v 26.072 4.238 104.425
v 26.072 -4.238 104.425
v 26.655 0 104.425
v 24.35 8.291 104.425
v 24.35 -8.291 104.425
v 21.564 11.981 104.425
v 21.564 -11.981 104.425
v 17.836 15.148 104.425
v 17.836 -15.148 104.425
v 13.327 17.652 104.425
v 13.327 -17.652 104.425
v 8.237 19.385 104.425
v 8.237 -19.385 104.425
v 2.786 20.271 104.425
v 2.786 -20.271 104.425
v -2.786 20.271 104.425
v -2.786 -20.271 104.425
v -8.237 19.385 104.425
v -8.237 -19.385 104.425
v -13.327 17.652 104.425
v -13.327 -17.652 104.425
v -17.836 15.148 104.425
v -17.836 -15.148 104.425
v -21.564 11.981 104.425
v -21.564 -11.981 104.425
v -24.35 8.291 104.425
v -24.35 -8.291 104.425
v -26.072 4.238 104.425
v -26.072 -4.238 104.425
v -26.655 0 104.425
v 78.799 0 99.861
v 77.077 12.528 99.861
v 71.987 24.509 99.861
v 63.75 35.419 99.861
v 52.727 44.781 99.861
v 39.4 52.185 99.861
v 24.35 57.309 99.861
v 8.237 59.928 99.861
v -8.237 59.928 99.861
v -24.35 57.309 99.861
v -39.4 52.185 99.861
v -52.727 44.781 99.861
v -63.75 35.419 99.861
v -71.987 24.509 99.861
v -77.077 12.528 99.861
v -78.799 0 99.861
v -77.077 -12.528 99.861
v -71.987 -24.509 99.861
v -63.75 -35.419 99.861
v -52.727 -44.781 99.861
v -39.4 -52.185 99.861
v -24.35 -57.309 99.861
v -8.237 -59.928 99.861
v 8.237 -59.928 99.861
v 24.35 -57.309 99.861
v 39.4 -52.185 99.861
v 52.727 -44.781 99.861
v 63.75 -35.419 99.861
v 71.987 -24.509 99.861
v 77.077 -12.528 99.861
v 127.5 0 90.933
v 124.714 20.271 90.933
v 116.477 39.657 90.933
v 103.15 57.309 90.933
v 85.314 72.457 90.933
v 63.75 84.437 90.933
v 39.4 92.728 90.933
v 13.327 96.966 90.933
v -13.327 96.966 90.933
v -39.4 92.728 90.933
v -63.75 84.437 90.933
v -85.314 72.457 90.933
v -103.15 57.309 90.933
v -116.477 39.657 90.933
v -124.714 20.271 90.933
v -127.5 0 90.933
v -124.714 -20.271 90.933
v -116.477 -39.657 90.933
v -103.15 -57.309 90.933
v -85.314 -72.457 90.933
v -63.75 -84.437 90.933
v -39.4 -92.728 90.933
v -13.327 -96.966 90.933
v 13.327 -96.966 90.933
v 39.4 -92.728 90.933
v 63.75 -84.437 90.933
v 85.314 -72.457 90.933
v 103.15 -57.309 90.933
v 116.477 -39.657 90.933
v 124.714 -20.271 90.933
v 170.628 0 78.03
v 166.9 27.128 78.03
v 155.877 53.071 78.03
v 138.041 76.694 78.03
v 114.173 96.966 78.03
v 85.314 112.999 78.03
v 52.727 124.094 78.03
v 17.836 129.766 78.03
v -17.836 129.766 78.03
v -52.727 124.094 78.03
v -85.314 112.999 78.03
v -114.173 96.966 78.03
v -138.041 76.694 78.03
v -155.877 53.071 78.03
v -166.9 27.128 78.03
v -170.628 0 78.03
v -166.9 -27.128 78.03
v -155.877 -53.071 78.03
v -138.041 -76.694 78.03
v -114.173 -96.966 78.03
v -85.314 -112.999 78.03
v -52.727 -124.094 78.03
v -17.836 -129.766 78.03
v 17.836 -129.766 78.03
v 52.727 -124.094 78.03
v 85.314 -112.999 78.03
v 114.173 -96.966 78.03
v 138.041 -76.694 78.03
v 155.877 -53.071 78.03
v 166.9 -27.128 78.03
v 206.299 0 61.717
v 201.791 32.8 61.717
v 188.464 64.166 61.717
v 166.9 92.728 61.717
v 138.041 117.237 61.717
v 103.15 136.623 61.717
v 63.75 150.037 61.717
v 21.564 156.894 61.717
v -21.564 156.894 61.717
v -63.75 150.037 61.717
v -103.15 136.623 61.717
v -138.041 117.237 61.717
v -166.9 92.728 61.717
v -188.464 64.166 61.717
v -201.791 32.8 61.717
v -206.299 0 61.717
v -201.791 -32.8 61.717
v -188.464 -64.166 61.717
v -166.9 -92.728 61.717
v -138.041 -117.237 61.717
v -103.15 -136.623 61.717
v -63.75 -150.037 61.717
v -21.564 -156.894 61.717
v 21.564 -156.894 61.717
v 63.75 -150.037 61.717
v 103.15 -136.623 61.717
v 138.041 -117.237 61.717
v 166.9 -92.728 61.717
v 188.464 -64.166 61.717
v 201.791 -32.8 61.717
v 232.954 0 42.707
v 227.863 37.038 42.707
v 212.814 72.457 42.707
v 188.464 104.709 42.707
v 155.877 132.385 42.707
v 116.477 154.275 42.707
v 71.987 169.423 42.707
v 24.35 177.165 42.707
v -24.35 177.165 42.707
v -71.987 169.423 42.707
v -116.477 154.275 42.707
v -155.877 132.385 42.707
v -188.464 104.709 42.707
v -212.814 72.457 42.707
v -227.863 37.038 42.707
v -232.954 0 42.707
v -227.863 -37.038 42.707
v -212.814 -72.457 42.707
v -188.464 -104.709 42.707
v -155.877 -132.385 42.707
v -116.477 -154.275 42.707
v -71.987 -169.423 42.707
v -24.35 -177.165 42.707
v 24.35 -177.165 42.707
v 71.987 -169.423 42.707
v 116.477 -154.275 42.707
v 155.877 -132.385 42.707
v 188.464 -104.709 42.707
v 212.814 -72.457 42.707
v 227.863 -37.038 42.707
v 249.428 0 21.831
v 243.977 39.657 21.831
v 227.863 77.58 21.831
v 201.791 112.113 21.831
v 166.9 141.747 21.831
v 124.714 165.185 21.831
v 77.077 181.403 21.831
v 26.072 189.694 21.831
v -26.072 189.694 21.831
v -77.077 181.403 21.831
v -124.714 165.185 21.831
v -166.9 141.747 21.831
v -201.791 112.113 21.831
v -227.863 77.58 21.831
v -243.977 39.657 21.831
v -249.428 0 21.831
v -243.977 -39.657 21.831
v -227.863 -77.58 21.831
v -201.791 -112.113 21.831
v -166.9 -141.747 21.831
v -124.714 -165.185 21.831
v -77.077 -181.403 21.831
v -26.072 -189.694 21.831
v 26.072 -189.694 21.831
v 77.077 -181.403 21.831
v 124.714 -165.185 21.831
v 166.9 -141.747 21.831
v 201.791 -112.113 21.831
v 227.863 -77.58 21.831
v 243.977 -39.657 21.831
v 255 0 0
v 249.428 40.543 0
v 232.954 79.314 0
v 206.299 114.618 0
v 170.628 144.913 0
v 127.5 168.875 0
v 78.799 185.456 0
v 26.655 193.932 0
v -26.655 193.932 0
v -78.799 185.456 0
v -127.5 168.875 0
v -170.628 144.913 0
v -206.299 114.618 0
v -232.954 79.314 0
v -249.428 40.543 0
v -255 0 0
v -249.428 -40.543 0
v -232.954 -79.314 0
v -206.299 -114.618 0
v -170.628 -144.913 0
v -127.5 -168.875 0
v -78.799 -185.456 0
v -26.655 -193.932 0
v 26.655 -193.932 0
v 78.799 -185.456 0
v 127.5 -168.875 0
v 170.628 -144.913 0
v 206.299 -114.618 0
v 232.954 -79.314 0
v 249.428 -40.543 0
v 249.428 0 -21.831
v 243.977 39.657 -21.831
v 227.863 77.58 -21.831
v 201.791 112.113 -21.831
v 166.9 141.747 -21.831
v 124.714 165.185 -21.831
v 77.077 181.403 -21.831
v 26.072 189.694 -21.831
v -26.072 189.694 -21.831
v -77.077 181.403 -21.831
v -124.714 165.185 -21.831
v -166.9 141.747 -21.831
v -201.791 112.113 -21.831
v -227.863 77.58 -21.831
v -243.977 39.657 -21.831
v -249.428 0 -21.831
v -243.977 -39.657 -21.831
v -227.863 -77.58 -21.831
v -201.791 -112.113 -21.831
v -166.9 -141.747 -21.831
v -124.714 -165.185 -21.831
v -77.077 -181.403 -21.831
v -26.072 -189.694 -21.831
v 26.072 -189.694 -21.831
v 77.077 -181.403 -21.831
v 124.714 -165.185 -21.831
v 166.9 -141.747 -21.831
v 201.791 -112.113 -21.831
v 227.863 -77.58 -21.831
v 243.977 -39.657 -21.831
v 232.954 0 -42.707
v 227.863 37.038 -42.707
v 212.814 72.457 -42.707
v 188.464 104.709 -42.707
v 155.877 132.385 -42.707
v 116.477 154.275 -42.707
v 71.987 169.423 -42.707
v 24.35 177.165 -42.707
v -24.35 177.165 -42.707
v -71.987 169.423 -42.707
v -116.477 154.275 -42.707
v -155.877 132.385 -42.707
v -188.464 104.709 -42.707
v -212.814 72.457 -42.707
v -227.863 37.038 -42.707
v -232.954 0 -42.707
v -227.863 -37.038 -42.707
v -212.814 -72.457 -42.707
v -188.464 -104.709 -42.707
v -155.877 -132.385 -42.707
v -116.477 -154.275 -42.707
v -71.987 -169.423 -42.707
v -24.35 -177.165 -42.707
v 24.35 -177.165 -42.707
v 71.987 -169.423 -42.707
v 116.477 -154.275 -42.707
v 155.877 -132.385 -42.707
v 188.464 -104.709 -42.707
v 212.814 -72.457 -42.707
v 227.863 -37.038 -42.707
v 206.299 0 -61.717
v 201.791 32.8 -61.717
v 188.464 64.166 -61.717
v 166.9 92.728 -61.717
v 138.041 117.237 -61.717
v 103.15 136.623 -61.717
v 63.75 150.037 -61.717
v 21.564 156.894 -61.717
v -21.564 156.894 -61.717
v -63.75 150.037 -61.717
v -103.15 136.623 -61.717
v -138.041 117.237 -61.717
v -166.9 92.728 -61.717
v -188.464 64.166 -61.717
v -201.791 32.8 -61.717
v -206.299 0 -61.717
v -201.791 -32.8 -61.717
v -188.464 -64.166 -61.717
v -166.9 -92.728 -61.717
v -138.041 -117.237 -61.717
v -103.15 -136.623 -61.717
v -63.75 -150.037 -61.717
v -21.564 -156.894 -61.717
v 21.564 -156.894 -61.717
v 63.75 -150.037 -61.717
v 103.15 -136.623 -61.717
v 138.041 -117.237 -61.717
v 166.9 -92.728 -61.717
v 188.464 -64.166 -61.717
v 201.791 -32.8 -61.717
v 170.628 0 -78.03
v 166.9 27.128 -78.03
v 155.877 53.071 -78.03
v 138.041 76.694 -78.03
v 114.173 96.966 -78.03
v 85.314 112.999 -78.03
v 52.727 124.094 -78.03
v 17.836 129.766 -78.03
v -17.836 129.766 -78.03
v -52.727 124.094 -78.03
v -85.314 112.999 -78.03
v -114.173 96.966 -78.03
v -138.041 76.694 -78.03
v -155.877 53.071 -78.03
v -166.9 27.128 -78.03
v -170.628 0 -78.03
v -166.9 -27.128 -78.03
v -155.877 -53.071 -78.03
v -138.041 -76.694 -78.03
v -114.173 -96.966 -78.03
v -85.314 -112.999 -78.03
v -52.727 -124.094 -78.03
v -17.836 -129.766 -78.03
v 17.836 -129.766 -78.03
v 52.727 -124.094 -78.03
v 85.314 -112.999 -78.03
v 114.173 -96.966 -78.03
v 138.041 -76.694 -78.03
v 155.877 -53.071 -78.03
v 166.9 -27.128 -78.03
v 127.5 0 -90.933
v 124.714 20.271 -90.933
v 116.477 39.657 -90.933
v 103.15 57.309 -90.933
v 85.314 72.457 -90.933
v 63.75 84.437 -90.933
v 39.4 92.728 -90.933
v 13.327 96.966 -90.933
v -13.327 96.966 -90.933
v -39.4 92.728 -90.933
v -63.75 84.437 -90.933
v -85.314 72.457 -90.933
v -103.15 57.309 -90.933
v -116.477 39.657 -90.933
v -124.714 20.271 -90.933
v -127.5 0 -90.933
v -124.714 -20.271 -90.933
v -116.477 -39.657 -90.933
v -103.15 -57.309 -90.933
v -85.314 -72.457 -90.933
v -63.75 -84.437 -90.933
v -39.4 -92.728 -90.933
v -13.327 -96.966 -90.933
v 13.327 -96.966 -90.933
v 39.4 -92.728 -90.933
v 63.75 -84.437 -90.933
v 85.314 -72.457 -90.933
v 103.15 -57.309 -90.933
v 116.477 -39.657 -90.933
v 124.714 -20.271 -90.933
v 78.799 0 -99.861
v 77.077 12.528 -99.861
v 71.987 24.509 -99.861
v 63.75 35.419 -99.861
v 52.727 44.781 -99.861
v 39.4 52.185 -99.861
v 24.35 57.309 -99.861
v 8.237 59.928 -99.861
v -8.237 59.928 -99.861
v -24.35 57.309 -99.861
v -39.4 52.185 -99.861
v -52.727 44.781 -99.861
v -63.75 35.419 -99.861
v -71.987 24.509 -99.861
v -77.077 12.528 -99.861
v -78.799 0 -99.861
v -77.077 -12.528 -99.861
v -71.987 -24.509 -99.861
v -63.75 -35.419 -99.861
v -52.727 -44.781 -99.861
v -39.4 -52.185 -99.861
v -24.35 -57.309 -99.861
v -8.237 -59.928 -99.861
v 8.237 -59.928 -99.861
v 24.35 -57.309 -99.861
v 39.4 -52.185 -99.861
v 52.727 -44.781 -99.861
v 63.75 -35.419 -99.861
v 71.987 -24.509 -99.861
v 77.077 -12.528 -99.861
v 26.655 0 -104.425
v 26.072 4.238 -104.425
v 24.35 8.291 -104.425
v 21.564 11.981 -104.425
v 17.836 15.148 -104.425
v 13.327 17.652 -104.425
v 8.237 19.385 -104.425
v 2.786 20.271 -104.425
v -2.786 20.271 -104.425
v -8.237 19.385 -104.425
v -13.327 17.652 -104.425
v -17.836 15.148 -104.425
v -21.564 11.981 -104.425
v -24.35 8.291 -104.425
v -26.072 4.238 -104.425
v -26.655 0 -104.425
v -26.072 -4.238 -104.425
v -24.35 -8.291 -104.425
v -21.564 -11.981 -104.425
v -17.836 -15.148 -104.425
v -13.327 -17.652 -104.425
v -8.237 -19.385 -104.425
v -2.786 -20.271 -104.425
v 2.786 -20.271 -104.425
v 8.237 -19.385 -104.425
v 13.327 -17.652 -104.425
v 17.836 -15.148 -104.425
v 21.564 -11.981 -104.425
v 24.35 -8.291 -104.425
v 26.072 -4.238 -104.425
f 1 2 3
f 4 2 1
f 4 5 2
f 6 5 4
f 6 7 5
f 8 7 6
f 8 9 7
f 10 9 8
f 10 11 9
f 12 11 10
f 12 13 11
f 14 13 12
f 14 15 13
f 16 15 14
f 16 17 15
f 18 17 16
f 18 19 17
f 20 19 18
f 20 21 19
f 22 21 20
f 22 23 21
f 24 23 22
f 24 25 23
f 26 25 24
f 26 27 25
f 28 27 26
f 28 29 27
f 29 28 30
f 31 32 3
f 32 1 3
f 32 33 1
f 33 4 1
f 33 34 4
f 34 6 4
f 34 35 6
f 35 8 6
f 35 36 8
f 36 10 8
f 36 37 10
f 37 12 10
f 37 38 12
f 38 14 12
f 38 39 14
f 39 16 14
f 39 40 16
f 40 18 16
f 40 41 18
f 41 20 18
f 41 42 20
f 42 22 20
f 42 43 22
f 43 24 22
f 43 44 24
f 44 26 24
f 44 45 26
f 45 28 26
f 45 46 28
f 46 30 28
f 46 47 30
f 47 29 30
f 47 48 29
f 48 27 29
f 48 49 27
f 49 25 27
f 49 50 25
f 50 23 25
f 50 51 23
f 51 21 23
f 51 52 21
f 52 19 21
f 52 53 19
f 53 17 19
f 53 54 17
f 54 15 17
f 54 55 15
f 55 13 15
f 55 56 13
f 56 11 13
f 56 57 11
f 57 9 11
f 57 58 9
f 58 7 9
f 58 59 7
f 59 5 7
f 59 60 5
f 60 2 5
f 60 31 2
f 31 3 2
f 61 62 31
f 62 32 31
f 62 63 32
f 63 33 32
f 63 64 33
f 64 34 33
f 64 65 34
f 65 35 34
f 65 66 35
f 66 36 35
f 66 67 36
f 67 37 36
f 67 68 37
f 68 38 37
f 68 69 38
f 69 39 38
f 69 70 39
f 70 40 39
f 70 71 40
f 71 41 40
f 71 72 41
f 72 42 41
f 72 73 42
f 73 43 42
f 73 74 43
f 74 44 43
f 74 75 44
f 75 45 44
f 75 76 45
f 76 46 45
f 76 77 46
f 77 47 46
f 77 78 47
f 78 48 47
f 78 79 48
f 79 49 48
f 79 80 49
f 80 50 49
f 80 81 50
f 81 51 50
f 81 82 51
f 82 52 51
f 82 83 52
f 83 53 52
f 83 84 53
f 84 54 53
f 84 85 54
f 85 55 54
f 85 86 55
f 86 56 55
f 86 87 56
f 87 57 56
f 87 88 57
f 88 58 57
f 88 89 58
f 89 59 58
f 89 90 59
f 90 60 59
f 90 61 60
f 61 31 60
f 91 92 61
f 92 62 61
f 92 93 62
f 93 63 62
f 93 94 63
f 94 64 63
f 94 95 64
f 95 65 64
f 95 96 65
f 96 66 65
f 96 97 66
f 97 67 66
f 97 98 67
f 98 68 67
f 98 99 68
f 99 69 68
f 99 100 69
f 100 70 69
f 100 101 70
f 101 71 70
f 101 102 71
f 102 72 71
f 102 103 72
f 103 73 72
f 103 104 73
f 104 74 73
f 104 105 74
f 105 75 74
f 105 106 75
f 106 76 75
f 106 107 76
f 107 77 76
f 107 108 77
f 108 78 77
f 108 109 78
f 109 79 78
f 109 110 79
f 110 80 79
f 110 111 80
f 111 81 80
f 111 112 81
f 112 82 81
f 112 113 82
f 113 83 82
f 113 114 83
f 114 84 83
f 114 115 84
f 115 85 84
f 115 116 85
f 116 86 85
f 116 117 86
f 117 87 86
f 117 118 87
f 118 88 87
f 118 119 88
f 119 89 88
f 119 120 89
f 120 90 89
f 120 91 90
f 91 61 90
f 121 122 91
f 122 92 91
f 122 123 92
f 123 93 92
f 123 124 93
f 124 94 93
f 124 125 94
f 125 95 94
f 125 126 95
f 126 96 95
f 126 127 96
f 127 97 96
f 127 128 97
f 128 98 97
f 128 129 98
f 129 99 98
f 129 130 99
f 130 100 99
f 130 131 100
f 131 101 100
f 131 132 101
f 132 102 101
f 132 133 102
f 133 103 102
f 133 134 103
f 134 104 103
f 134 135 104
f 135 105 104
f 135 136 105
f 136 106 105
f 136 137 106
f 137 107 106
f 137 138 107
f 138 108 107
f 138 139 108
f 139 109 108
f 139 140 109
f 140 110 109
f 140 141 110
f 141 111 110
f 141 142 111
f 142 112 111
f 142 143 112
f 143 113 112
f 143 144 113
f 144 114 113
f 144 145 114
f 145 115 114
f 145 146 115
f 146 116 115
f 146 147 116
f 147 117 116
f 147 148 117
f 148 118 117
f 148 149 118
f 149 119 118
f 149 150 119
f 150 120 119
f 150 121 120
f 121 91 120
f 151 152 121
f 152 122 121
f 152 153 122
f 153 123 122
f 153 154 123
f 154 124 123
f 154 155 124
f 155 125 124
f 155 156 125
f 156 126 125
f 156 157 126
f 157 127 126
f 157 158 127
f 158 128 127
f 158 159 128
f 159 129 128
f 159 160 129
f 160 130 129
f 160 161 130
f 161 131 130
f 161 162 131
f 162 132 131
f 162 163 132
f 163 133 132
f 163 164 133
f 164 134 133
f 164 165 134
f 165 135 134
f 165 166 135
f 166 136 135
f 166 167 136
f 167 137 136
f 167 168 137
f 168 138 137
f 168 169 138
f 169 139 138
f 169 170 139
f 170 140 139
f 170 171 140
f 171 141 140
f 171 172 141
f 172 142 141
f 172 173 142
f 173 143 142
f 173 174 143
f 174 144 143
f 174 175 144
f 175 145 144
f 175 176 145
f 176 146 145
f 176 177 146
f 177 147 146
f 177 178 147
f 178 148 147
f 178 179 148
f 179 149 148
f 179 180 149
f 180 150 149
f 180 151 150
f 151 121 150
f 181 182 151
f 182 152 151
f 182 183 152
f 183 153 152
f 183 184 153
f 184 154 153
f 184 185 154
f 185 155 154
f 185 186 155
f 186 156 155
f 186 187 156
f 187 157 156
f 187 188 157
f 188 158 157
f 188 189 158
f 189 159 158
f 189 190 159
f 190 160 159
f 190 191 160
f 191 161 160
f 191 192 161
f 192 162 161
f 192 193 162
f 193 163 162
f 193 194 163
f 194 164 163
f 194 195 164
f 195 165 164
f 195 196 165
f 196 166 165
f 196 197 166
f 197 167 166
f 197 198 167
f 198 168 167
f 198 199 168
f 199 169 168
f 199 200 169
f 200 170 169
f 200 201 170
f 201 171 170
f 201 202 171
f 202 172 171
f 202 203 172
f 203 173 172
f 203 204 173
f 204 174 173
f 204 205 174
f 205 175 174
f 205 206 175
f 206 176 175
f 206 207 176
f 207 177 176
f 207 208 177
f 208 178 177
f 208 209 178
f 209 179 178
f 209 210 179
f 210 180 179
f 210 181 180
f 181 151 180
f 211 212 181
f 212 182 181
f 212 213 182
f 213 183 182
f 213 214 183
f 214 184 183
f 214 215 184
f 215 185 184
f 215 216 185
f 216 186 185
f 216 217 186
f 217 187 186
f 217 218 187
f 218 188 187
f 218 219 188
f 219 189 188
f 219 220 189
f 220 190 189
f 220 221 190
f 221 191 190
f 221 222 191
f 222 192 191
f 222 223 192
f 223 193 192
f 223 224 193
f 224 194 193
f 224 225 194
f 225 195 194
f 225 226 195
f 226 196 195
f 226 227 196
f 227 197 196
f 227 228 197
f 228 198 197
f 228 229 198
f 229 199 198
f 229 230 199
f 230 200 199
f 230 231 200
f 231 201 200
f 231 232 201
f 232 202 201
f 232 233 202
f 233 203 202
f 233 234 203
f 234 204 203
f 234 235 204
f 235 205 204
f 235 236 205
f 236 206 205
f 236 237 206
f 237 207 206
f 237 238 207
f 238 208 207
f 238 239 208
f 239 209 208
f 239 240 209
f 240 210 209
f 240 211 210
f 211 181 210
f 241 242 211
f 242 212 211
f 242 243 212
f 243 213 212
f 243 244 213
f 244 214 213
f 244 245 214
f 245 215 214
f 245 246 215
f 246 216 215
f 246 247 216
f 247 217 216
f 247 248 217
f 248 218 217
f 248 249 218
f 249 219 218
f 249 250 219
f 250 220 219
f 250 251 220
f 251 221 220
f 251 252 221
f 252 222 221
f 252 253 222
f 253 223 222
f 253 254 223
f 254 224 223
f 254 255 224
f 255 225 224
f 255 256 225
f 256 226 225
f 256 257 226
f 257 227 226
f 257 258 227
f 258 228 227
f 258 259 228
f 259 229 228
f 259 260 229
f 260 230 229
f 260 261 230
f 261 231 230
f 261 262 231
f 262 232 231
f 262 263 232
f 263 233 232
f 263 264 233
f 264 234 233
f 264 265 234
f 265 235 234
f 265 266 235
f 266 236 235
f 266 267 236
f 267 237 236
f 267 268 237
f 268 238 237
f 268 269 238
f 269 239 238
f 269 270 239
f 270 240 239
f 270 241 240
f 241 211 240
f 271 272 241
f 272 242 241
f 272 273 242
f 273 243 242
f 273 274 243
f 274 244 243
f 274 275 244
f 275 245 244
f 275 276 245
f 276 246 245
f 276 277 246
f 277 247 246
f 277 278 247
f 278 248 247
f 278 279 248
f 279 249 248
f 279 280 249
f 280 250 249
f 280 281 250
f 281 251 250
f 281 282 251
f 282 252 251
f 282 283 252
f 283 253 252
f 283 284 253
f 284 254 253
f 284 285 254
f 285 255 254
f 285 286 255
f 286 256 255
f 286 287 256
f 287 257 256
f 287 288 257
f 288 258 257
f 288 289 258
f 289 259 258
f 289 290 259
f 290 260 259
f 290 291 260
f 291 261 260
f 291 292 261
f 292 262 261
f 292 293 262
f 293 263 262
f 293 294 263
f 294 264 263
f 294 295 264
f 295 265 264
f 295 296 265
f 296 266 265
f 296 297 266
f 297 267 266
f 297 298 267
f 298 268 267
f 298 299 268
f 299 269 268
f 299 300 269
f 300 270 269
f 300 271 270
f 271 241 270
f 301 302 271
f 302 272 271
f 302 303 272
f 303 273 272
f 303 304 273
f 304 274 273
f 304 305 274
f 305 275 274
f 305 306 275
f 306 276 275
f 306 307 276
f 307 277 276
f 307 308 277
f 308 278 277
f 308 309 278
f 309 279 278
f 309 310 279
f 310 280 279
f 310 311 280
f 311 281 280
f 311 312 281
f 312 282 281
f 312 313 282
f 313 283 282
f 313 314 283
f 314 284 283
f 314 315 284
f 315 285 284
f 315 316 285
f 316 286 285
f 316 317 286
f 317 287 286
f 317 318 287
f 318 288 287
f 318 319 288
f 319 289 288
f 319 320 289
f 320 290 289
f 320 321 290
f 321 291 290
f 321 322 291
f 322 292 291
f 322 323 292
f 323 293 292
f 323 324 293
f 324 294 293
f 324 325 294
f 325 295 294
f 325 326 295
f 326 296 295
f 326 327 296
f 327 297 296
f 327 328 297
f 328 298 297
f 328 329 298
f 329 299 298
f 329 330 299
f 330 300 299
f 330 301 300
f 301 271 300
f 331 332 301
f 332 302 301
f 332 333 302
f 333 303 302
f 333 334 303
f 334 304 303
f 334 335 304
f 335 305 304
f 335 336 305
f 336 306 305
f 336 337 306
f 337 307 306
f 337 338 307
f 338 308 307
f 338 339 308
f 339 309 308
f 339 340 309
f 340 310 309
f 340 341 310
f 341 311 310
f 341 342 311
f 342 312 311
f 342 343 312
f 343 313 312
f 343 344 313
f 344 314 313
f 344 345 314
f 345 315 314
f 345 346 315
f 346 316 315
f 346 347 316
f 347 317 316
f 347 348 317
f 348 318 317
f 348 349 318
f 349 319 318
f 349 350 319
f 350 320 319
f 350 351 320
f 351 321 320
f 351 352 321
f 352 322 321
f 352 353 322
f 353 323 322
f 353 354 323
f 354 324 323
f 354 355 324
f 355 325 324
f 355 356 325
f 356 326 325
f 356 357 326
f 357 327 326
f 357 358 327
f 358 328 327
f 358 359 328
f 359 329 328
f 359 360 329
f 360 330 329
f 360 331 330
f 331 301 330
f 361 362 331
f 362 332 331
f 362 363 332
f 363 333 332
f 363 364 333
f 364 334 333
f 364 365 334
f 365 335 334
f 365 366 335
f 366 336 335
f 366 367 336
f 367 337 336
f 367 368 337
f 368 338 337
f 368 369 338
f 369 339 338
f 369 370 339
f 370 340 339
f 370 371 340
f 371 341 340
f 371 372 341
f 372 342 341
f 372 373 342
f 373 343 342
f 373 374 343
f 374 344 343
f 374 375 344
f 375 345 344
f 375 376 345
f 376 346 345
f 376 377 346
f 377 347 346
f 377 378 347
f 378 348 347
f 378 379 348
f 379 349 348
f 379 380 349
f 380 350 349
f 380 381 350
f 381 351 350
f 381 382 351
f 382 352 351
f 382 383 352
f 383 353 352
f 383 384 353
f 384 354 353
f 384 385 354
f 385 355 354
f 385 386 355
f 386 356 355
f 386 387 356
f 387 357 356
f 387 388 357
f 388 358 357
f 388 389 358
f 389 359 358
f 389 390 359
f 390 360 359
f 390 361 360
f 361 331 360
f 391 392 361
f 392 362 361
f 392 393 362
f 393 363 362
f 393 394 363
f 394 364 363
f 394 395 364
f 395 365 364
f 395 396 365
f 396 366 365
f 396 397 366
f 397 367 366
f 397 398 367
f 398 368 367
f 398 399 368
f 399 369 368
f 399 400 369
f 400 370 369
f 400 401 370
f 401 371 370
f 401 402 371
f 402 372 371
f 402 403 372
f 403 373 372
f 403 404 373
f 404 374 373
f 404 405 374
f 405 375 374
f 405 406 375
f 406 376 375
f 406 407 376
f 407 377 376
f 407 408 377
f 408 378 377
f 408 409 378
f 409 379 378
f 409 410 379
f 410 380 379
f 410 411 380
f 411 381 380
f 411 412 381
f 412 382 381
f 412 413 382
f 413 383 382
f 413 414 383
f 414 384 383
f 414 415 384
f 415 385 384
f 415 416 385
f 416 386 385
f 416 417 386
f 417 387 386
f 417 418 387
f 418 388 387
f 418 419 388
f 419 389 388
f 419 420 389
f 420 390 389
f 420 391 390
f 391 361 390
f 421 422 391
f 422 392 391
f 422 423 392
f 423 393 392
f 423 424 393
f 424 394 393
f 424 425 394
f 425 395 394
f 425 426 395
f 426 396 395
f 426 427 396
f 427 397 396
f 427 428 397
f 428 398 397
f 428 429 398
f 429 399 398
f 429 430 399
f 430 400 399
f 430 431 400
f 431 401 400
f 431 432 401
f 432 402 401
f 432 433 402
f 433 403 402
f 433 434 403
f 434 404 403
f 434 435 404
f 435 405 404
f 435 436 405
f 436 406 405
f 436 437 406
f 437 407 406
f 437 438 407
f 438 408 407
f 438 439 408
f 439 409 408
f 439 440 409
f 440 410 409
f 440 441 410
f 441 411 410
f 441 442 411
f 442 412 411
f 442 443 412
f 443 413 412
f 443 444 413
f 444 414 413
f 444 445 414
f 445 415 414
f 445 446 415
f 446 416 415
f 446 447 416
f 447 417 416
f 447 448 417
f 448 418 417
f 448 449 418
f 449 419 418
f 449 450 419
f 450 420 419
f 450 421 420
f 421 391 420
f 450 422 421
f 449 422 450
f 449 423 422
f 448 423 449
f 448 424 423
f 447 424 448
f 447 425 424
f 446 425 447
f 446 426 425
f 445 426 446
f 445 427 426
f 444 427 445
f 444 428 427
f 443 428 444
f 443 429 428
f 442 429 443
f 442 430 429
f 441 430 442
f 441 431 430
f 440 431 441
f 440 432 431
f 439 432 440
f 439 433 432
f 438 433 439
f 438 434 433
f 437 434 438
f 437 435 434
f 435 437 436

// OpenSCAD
// Generated by SolidPython 1.0.1 on 2020-07-29 00:46:53


scale(v = [17, 13, 7]) {
	sphere(r = 15);
}
/***********************************************
*********      SolidPython code:      **********
************************************************
 
# import packages: SolidPython
from solid import *
from solid.utils import *
from itertools import chain, combinations, permutations


class Resize:

    def __init__(self, scad_file):
        self.scad_file = scad_file
        #self.scad_file = import_scad(scad_file)
        # cone/cylinder param:
        self.r1 = 0
        self.r2 = 0
        self.h = 0
        # rectangular prism param:
        self.w = 0
        self.l = 0
        # ellipse param:
        self.r = 0

    # import OpenScad code (file name corresponds to shape)


    # classify shape + parameters
    def assign(self, param1, param2, param3):
        if self.scad_file == 'cone.scad':
            self.r1 = param1
            self.r2 = param2
            self.h = param3
        elif self.scad_file == 'cylinder.scad':
            self.r1 = param1
            self.r2 = param2
            self.h = param3
        elif self.scad_file == 'rectangularPrism.scad':
            self.h = param1
            self.l = param2
            self.w = param3
        else:
            self.r = param1
            self.h = param2

    # resize parameters
    def iterate(self):
        x = range(3, 20, 2)
        i = 1
        if self.scad_file == 'cone.scad':
            tempList = list(permutations(x, 2))
            for temp in tempList:
                param1 = temp[0]
                param2 = temp[1]
                filepath = 'produced_scad_files/' + 'cone' + str(param1) + '_' + str(param2) + '_' + '.scad'
                scad_render_to_file(cylinder(h=param1, r1=param2, r2=0), filepath)

        elif self.scad_file == 'cylinder.scad':
            tempList = list(permutations(x, 3))
            for temp in tempList:
                param1 = temp[0]
                param2 = temp[1]
                filepath = 'produced_scad_files/' + 'cylinder' + str(param1) + '_' + str(param2) + '_' + '.scad'
                scad_render_to_file(cylinder(h=param1, r1=param2, r2=param2), filepath)

        elif self.scad_file == 'rectangularPrism.scad':
            tempList = list(permutations(x, 3))
            for temp in tempList:
                param1 = temp[0]
                param2 = temp[1]
                param3 = temp[2]
                filepath = 'produced_scad_files/' + 'rectangularPrism' + str(param1) + '_' + str(param2) + '_' + str(
                    param3) + '.scad'
                scad_render_to_file(cube(size=(param1, param2, param3)), filepath)

        elif self.scad_file == 'ellipse.scad':
            tempList = list(permutations(x, 4))
            for temp in tempList:
                param1 = temp[0]
                param2 = temp[1]
                param3 = temp[2]
                param4 = temp[3]
                filepath = 'produced_scad_files/' + 'ellipse' + str(param1) + '_' + str(param2) + '_' + str(param3) + '_' + str(param4) + '.scad'
                scad_render_to_file(scale([param1, param2, param3])(sphere(r=param4)), filepath)

    def render_to_scadfile(self):
        scad_render_to_file(scad, 'example.scad') 
 
************************************************/
